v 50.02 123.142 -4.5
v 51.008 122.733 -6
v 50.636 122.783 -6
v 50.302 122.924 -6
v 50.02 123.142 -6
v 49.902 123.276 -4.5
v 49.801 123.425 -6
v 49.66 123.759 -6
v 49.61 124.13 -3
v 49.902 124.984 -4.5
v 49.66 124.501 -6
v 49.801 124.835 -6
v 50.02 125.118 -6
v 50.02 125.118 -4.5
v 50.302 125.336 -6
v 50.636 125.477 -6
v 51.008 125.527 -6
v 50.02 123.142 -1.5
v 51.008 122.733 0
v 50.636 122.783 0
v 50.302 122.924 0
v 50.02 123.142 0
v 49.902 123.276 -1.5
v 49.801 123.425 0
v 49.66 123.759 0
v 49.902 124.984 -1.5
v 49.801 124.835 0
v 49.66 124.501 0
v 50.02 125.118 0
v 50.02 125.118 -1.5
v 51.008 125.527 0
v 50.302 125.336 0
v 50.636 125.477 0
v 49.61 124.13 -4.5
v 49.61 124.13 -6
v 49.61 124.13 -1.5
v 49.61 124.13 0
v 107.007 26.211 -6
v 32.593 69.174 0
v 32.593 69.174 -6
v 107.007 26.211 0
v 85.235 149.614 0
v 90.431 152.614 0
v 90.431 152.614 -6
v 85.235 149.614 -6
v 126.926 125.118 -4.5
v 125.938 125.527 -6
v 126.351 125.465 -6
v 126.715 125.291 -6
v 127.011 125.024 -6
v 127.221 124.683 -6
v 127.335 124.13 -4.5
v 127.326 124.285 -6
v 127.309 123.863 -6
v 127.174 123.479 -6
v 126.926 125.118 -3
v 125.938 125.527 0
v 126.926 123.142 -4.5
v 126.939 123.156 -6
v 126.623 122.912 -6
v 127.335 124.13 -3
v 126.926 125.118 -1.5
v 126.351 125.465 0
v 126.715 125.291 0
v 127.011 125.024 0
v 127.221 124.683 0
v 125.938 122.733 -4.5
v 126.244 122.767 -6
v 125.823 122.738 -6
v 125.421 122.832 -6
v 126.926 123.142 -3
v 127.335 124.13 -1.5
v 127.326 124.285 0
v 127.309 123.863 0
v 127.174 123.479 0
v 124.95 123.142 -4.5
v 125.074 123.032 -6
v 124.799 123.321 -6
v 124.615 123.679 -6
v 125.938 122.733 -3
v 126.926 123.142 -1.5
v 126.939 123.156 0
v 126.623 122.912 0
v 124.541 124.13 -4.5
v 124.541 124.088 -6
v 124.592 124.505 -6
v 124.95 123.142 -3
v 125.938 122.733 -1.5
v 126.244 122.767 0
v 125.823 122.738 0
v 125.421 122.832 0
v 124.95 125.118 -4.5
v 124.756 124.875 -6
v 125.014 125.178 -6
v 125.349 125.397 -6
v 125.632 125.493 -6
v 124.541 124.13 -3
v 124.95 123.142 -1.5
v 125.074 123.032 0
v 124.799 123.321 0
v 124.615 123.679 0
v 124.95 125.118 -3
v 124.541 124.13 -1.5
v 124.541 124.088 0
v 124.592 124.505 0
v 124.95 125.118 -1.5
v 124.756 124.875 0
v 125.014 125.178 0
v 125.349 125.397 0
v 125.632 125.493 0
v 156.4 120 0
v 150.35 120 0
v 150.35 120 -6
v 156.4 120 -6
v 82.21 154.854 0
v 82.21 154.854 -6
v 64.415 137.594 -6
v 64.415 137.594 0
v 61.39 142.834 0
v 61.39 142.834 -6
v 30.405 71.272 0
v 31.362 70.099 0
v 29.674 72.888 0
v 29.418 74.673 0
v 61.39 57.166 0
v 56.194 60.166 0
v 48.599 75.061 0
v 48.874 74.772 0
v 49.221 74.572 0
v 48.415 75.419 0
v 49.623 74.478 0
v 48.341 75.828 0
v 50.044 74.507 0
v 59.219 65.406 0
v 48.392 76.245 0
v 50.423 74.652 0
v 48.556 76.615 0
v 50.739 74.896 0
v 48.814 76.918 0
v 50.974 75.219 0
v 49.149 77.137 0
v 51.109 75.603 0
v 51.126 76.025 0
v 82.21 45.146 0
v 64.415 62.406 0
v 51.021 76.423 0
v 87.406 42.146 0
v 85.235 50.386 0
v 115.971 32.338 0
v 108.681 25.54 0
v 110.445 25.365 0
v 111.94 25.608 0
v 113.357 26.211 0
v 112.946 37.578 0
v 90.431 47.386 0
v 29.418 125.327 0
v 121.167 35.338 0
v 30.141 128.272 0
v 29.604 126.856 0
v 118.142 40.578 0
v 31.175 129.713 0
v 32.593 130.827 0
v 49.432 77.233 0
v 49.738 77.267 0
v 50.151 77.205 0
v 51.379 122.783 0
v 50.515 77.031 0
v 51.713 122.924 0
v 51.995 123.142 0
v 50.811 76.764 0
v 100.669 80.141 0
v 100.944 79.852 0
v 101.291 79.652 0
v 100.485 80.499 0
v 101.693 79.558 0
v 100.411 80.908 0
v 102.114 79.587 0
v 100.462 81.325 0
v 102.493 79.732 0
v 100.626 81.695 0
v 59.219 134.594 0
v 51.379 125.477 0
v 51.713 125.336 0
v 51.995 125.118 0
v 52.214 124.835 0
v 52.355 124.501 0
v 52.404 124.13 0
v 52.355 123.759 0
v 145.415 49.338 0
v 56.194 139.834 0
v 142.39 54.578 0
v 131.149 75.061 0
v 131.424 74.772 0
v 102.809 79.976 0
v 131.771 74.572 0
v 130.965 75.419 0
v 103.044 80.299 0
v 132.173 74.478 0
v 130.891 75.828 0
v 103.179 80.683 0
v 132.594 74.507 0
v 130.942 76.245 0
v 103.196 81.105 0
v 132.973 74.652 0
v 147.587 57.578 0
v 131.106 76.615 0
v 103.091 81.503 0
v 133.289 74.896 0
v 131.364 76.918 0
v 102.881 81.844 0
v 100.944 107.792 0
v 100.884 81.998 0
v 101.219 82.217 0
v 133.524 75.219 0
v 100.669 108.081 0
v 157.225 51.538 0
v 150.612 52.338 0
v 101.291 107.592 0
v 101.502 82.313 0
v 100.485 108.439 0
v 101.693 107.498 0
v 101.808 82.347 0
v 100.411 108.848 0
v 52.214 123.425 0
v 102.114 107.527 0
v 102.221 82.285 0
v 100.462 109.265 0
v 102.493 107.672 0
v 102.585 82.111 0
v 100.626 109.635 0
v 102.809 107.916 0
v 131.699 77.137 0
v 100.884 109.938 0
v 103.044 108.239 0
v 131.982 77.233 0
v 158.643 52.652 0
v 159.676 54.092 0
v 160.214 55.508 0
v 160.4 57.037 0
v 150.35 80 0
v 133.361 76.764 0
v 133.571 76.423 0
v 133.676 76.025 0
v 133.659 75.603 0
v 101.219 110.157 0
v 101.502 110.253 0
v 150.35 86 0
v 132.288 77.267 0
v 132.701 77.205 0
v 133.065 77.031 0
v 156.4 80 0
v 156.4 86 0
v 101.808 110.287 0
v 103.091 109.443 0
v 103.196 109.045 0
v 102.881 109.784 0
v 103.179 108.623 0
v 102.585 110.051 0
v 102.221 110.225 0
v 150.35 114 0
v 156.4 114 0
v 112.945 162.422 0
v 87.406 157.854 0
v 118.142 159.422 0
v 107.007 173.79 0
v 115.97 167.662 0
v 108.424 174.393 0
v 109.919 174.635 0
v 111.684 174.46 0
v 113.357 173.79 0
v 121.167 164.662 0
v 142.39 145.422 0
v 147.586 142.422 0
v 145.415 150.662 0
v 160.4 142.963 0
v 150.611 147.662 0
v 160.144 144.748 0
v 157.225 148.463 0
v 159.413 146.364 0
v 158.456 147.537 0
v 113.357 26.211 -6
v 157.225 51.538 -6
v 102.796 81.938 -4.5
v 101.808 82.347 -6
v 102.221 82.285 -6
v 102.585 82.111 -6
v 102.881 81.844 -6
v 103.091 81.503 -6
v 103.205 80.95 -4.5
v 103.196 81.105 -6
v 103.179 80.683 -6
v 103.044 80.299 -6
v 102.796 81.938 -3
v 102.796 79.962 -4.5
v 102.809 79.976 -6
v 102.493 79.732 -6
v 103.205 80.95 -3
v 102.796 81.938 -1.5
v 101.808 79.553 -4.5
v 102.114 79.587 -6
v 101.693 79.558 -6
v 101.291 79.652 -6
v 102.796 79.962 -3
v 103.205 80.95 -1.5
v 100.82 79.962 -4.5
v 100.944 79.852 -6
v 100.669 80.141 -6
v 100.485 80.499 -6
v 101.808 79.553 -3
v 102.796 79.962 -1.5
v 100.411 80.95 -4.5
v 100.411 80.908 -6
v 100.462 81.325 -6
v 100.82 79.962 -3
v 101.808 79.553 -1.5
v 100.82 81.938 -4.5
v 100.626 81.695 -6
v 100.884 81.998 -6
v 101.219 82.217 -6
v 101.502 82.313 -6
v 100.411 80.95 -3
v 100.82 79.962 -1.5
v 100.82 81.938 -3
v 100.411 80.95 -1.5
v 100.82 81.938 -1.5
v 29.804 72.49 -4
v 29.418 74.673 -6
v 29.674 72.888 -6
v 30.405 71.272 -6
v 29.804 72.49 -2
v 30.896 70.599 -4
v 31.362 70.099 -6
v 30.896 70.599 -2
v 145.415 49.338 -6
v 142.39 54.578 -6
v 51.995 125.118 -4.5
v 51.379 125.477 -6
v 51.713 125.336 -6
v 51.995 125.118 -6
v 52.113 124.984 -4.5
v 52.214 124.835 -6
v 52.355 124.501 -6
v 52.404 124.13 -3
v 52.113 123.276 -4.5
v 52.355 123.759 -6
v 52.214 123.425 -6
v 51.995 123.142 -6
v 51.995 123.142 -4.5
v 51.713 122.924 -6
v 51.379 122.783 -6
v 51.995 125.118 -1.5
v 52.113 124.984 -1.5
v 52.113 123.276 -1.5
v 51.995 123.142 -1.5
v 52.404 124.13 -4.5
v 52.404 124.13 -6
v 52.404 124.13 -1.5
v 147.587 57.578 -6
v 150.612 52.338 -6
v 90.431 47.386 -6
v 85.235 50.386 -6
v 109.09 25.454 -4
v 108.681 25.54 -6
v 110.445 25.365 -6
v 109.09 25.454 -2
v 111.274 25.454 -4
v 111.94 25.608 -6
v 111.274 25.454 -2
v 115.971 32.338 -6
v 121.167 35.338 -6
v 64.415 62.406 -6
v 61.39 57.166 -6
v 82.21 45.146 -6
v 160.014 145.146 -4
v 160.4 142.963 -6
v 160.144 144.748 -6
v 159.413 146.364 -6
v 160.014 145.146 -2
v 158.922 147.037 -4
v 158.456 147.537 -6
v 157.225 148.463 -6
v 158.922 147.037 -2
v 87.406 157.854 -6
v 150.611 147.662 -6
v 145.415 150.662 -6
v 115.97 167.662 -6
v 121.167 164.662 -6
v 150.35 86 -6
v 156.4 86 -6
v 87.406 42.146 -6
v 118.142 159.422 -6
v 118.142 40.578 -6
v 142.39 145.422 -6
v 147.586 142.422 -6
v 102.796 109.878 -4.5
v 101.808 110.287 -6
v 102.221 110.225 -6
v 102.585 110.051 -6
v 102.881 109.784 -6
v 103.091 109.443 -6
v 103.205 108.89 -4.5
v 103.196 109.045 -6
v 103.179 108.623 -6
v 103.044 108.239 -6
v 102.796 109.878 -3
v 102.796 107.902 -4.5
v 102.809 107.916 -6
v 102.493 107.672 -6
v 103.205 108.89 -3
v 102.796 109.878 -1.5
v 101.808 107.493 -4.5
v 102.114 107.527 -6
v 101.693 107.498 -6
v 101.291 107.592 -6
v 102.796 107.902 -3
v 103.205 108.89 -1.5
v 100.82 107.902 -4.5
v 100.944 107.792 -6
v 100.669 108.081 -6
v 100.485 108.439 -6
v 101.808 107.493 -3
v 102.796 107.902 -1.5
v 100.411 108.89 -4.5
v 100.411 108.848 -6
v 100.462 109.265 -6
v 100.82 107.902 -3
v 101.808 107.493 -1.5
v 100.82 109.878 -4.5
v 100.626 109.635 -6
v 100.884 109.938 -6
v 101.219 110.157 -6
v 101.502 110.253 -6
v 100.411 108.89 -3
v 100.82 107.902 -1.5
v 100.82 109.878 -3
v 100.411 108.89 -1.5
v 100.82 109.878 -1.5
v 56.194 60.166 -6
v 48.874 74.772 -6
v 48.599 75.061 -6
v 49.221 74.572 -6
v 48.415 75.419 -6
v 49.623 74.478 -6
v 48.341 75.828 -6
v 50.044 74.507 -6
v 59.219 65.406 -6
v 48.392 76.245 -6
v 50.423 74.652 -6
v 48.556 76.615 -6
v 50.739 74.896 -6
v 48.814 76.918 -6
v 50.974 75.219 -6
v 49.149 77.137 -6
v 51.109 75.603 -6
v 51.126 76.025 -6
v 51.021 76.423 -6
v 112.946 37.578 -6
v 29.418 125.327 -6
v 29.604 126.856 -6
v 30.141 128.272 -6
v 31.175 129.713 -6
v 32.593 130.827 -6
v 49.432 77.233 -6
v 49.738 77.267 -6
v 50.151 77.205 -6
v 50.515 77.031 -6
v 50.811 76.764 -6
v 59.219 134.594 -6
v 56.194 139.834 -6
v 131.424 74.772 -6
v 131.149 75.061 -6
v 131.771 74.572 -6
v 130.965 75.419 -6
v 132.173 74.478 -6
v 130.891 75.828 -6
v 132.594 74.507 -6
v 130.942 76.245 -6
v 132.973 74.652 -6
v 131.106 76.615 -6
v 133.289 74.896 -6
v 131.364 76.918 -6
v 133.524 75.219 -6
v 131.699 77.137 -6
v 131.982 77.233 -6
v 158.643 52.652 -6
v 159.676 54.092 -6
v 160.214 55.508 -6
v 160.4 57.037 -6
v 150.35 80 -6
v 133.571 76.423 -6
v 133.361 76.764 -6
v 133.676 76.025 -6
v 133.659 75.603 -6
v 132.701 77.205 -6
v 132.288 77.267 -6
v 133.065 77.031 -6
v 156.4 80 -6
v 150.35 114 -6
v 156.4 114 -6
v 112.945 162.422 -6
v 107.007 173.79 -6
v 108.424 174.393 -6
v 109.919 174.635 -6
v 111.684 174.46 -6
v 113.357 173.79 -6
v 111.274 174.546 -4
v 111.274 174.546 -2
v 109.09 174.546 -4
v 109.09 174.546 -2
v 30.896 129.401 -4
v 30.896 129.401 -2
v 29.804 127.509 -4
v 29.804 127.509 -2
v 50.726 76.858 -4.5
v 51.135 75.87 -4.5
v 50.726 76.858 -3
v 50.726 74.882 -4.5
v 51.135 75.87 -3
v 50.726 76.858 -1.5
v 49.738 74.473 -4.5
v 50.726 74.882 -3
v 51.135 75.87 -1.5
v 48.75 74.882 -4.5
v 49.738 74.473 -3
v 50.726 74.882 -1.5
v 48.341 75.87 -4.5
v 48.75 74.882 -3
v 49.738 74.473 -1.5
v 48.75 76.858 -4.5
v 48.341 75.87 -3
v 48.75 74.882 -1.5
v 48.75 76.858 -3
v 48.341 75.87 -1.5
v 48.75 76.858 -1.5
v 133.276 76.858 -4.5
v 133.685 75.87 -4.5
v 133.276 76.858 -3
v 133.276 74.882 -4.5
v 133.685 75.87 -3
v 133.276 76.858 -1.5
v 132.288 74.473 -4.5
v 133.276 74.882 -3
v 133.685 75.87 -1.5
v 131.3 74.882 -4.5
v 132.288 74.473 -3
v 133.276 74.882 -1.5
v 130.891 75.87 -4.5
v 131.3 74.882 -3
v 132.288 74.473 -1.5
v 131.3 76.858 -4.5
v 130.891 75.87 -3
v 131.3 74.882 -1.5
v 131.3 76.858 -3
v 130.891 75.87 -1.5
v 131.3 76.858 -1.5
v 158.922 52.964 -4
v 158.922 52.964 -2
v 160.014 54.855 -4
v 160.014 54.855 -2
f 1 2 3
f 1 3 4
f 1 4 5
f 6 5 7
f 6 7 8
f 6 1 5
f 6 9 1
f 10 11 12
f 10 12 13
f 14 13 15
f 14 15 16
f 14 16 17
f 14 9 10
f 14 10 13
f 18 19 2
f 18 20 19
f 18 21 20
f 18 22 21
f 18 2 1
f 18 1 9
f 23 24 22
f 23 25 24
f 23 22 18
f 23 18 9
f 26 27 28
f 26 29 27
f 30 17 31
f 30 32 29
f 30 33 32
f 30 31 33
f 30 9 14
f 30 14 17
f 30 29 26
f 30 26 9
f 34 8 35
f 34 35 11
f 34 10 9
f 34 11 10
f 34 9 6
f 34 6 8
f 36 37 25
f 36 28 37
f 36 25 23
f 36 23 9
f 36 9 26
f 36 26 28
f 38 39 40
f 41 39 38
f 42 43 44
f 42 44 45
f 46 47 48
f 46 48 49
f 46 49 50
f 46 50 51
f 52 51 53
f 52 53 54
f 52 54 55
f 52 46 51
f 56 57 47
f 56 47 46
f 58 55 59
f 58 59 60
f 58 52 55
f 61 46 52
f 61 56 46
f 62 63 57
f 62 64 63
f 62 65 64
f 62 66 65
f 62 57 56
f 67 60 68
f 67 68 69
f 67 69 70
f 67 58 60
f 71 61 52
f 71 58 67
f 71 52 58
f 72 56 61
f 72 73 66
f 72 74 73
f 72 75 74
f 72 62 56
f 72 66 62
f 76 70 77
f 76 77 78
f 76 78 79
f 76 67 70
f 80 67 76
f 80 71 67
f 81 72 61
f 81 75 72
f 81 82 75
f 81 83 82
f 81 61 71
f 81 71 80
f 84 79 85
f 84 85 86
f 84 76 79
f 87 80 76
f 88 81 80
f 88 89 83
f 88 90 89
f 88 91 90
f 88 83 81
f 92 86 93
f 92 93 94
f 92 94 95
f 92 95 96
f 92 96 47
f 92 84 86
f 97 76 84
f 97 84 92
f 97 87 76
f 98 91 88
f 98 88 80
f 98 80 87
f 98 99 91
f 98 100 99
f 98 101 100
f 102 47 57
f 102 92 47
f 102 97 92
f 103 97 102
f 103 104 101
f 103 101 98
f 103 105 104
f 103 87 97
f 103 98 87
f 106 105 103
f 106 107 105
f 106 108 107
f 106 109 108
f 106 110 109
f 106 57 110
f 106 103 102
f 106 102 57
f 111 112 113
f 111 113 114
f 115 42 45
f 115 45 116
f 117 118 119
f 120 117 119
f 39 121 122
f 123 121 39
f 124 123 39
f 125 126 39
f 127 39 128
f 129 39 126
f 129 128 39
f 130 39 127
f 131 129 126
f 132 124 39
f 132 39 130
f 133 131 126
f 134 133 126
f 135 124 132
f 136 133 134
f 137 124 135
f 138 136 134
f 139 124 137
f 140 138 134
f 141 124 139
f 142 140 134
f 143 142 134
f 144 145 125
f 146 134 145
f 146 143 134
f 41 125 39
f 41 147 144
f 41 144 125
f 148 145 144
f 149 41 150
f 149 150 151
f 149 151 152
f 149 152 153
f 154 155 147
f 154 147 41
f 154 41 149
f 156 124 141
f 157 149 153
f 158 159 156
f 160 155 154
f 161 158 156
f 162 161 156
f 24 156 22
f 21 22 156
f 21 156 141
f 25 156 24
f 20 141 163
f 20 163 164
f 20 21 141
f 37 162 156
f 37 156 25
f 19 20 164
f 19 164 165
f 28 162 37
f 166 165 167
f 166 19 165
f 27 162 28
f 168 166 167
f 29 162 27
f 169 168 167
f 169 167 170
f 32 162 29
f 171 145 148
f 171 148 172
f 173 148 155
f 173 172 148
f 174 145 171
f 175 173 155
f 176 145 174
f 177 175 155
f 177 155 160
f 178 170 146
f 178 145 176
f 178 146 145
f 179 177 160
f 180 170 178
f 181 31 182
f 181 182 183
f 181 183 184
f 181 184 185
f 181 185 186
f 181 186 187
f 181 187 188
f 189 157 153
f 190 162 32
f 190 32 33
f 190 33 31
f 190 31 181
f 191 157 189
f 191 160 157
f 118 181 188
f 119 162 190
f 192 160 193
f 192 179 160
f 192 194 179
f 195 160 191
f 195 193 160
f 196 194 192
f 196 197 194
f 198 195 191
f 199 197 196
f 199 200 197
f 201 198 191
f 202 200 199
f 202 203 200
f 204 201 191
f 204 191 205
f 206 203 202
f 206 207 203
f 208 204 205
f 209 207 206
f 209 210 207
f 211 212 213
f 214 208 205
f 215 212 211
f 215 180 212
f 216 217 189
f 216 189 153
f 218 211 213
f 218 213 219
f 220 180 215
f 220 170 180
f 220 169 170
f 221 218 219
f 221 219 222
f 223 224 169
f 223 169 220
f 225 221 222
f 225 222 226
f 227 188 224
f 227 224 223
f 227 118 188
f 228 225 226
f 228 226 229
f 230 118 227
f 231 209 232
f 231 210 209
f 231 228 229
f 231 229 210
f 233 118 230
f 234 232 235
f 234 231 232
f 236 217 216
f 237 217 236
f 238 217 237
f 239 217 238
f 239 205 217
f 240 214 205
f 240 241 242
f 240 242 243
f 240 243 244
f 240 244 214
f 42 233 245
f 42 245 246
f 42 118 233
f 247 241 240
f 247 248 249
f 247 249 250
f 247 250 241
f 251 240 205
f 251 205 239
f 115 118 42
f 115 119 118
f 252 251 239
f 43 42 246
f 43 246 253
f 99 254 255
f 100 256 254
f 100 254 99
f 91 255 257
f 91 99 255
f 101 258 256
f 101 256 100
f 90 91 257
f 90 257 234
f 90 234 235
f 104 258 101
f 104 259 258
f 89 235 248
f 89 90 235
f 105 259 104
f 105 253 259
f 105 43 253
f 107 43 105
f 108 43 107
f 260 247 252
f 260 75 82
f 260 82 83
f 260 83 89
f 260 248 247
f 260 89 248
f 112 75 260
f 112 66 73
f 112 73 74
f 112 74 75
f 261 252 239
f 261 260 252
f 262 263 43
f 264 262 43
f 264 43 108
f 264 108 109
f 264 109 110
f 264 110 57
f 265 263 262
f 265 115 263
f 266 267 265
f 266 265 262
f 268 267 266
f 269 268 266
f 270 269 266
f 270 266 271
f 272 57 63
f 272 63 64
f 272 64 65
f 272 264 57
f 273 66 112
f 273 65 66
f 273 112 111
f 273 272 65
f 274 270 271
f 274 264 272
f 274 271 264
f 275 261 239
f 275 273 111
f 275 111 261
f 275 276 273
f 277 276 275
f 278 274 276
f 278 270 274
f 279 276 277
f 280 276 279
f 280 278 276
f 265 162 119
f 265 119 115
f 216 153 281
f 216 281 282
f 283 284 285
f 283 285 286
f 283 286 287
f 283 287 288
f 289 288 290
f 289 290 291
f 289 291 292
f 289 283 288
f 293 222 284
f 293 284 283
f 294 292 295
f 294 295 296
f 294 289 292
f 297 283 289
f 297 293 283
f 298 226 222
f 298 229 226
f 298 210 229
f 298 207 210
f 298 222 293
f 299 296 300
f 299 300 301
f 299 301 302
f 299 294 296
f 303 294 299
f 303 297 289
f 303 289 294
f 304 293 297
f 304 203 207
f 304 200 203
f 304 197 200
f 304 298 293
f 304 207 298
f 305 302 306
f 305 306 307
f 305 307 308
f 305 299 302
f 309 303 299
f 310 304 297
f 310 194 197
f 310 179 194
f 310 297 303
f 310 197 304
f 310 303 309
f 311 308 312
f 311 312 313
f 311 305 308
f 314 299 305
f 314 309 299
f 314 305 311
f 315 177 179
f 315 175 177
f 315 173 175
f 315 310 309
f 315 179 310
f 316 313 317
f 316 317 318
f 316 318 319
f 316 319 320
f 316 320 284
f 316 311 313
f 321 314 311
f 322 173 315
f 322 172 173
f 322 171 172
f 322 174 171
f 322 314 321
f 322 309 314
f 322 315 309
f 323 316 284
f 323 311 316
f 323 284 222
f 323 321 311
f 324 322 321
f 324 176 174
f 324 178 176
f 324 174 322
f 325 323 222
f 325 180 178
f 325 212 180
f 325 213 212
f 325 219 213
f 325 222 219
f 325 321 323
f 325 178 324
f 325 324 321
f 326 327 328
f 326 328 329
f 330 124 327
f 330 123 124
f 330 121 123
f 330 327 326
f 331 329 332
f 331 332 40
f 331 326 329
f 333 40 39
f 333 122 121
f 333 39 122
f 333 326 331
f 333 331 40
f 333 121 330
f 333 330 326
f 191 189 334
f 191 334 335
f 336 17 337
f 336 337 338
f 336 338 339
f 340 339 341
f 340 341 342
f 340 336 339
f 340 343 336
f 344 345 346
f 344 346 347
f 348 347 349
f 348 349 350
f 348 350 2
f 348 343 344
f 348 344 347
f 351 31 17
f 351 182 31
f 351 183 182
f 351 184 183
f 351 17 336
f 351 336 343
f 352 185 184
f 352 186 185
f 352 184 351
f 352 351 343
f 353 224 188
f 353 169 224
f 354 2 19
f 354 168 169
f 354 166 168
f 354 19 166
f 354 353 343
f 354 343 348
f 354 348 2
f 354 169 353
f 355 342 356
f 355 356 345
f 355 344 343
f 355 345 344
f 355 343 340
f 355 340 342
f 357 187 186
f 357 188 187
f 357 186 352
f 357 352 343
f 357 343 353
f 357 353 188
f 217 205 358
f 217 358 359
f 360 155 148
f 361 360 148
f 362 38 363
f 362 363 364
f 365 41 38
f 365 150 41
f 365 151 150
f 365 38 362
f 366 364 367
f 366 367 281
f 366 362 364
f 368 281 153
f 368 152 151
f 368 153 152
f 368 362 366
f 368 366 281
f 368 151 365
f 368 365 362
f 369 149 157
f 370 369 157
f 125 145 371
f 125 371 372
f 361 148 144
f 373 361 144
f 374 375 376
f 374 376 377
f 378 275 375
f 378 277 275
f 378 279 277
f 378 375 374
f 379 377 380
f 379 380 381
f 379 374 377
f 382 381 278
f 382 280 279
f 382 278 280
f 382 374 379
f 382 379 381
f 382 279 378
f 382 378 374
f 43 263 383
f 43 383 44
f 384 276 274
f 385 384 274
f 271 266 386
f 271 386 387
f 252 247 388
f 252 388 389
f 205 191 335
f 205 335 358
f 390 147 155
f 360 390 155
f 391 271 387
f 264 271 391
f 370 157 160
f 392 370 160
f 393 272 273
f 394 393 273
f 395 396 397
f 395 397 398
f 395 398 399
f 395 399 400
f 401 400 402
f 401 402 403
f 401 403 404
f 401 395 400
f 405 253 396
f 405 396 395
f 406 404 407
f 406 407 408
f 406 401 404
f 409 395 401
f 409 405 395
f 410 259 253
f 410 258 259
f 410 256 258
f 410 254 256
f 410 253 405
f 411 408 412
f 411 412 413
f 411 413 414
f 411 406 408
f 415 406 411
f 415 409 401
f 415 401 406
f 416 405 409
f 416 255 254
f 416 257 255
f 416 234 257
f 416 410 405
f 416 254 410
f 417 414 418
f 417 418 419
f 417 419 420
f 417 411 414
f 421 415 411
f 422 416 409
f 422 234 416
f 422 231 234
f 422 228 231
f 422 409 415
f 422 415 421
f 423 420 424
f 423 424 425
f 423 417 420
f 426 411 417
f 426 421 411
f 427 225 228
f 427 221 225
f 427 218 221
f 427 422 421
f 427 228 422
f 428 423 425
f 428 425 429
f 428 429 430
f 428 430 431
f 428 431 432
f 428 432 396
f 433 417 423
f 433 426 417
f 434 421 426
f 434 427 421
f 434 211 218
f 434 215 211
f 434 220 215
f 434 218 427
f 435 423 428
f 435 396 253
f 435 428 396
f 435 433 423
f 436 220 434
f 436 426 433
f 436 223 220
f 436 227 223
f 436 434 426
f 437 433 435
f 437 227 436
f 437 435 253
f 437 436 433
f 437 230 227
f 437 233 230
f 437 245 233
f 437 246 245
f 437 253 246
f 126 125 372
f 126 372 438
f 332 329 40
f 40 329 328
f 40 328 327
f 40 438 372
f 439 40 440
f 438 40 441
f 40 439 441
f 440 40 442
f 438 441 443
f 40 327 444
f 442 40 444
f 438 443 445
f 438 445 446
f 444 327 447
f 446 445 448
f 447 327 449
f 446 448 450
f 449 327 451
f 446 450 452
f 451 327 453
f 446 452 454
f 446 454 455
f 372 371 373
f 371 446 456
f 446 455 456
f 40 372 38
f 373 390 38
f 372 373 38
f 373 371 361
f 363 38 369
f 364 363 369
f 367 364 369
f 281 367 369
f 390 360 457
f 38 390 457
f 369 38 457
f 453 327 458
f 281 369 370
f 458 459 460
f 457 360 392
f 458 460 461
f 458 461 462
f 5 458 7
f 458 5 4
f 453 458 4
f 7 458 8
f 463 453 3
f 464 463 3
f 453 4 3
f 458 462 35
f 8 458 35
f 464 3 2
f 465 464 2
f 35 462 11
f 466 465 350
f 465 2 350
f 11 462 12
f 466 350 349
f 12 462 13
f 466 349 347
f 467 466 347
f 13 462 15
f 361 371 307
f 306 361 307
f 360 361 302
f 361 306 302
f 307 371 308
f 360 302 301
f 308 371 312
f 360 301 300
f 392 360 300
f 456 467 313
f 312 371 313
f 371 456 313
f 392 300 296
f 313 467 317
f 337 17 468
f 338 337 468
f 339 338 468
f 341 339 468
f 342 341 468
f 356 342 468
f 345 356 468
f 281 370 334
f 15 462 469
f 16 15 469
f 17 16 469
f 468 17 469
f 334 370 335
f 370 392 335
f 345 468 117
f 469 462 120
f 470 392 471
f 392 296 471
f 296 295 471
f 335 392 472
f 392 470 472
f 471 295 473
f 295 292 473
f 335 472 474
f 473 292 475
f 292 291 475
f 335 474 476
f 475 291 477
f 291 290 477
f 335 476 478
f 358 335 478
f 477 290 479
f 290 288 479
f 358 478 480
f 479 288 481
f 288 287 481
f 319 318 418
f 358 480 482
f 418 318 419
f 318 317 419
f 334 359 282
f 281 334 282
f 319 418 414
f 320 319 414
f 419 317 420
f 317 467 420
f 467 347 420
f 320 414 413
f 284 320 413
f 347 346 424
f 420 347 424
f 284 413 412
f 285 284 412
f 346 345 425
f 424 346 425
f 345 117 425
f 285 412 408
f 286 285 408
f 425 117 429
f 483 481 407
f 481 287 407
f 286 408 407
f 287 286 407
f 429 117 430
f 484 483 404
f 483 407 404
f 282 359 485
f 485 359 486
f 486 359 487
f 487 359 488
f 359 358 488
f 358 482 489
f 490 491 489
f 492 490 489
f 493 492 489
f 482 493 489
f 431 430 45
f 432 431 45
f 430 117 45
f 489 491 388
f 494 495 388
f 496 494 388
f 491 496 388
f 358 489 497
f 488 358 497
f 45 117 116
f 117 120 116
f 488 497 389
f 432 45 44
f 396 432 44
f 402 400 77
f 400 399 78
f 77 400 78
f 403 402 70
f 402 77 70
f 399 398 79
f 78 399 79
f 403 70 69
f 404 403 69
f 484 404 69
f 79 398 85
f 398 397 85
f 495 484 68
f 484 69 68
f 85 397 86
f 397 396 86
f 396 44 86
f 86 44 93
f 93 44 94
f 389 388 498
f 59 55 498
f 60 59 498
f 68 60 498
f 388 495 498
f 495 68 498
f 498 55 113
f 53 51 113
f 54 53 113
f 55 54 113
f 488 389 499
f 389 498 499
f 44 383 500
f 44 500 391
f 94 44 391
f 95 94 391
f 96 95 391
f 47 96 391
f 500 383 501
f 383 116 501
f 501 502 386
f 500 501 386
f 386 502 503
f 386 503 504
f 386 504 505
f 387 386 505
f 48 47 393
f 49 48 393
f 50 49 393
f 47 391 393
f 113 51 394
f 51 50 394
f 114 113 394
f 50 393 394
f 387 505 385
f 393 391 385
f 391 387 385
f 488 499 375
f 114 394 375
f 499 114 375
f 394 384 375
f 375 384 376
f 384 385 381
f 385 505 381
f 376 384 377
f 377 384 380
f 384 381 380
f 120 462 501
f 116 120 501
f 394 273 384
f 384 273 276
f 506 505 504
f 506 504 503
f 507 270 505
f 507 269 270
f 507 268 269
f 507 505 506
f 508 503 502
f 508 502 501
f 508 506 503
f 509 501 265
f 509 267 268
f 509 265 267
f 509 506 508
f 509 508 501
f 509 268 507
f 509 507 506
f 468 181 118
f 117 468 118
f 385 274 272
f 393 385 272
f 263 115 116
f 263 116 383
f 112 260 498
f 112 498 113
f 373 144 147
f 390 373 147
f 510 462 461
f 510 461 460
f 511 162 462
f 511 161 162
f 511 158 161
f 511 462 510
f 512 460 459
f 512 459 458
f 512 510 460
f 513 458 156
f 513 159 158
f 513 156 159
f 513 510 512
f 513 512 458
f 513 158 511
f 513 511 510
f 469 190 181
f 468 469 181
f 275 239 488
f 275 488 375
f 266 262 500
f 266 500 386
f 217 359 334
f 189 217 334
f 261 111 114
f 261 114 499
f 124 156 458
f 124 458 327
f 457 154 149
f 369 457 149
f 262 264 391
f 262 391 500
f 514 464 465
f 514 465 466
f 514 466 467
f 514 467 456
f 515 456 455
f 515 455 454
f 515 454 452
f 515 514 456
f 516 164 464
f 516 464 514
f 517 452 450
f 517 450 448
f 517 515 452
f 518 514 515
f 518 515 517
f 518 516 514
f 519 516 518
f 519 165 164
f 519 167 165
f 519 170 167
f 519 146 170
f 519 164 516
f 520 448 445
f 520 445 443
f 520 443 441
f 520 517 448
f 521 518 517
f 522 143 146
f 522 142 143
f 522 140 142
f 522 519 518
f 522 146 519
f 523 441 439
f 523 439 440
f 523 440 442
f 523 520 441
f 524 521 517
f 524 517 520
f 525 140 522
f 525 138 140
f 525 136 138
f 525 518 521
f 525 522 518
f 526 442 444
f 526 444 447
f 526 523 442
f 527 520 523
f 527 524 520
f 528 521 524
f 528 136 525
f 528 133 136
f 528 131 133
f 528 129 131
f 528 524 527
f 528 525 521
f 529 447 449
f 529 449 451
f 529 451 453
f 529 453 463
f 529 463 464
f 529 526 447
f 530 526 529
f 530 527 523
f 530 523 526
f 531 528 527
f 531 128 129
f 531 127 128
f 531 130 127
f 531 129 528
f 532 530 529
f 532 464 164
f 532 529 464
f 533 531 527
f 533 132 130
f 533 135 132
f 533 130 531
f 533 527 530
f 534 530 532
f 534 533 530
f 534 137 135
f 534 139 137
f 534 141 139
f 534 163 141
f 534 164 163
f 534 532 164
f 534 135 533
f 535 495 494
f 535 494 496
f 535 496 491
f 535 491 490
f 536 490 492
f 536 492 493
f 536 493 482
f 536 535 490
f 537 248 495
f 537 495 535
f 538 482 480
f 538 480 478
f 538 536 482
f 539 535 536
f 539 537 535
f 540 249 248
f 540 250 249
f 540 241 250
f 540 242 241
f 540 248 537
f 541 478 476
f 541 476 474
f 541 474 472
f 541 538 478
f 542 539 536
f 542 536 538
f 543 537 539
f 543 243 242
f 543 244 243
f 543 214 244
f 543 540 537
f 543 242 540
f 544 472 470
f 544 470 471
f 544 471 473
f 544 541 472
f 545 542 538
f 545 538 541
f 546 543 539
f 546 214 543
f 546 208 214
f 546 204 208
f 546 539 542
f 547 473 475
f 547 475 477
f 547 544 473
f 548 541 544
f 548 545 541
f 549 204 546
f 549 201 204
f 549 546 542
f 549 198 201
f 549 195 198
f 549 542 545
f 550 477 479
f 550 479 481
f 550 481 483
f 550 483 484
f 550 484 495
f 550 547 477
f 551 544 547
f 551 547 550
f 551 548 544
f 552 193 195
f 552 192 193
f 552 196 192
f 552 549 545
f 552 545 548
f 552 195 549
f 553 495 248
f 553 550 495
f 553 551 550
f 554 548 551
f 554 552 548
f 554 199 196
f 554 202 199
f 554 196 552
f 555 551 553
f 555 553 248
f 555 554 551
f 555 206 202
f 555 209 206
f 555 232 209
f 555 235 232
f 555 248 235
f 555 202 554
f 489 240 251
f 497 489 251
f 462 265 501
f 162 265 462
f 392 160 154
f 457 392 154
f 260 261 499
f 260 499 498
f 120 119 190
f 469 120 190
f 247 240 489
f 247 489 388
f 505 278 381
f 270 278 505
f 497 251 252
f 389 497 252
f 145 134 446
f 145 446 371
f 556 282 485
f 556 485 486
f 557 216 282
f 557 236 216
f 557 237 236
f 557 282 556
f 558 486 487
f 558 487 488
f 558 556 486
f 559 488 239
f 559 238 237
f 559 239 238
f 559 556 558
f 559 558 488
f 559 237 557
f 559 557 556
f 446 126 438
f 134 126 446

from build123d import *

# Parameters (mm, degrees)
CORTE_W                 = 6.05
CORTE_H                 = 6
SALIENTE_EXTRUIR1_DEPTH = 6


with BuildPart() as part:
    # Corte → Saliente-Extruir1 (new body)
    with BuildSketch(Plane.XY):
        with BuildLine():
            Line((113.357081542, 26.21056425), (157.224997542, 51.53767625))
            add(Edge.make_bspline(
                [(157.224997542, 51.53767625), (159.190322542, 52.67288025), (160.400350542, 54.76749825), (160.399997542, 57.03698825)],
                knots=[0, 0, 0, 0, 1, 1, 1, 1], degree=3))
            Line((160.399997542, 57.03698825), (160.399997542, 142.96314225))
            add(Edge.make_bspline(
                [(160.399997542, 142.96314225), (160.399645542, 145.23256125), (159.190675542, 147.32841425), (157.224997542, 148.46259425)],
                knots=[0, 0, 0, 0, 1, 1, 1, 1], degree=3))
            Line((157.224997542, 148.46259425), (113.357081542, 173.78956925))
            add(Edge.make_bspline(
                [(113.357081542, 173.78956925), (111.391403542, 174.92375025), (108.972053542, 174.92480825), (107.007081542, 173.78956925)],
                knots=[0, 0, 0, 0, 1, 1, 1, 1], degree=3))
            Line((107.007081542, 173.78956925), (32.592792542, 130.82652825))
            add(Edge.make_bspline(
                [(32.592792542, 130.82652825), (30.627711542, 129.69128925), (29.417379542, 127.59649425), (29.417792542, 125.32707525)],
                knots=[0, 0, 0, 0, 1, 1, 1, 1], degree=3))
            Line((29.417792542, 125.32707525), (29.417792542, 74.67277225))
            add(Edge.make_bspline(
                [(29.417792542, 74.67277225), (29.418206542, 72.40335325), (30.627157542, 70.30785325), (32.592792542, 69.17367225)],
                knots=[0, 0, 0, 0, 1, 1, 1, 1], degree=3))
            Line((32.592792542, 69.17367225), (107.007081542, 26.21056425))
            add(Edge.make_bspline(
                [(107.007081542, 26.21056425), (108.972758542, 25.07630125), (111.391756542, 25.07533725), (113.357081542, 26.21056425)],
                knots=[0, 0, 0, 0, 1, 1, 1, 1], degree=3))
        make_face()
        Polygon((82.209667177, 45.146306921), (87.405777131, 42.146233364), (90.430851301, 47.385644235), (85.234741347, 50.385717791), align=None, mode=Mode.SUBTRACT)
        Polygon((59.219111627, 65.405686508), (64.415251823, 62.405665331), (61.39023047, 57.166223967), (56.194090274, 60.166245143), align=None, mode=Mode.SUBTRACT)
        Polygon((115.970526872, 32.338235445), (121.166681404, 35.338231793), (118.141685086, 40.577687612), (112.945530555, 37.577691264), align=None, mode=Mode.SUBTRACT)
        Polygon((147.586560764, 57.577666916), (150.611557081, 52.338211097), (145.41540255, 49.338214749), (142.390406233, 54.577670568), align=None, mode=Mode.SUBTRACT)
        Polygon((59.219036883, 134.594225381), (64.415170597, 137.594257784), (61.390137924, 142.833692613), (56.194004209, 139.83366021), align=None, mode=Mode.SUBTRACT)
        Polygon((82.20954866, 154.853654641), (87.405652132, 157.853739425), (90.430737623, 152.61433509), (85.234634151, 149.614250307), align=None, mode=Mode.SUBTRACT)
        Polygon((112.945395686, 162.422336706), (115.970380683, 167.661799061), (121.166541696, 164.66181394), (118.141556699, 159.422351585), align=None, mode=Mode.SUBTRACT)
        Polygon((147.586469106, 142.422435899), (150.611454103, 147.661898254), (145.41529309, 150.661883375), (142.390308093, 145.42242102), align=None, mode=Mode.SUBTRACT)
        with Locations((153.374997542, 83.000060929)):
            Rectangle(CORTE_W, CORTE_H, mode=Mode.SUBTRACT)
        Polygon((150.349997542, 120.000060929), (156.399997542, 120.000060929), (156.399997542, 114.000060929), (150.349997542, 114.000054393), align=None, mode=Mode.SUBTRACT)
        with BuildLine():
            add(Edge.make_bspline(
                [(51.13479556, 75.869945702), (51.134797227, 75.098420702), (50.509323579, 74.47294435), (49.737798579, 74.472942683)],
                knots=[0, 0, 0, 0, 1, 1, 1, 1], degree=3))
            add(Edge.make_bspline(
                [(49.737798579, 74.472942683), (48.966273579, 74.472941016), (48.340797227, 75.098414665), (48.34079556, 75.869939665)],
                knots=[0, 0, 0, 0, 1, 1, 1, 1], degree=3))
            add(Edge.make_bspline(
                [(48.34079556, 75.869939665), (48.340793893, 76.641464665), (48.966267542, 77.266941016), (49.737792542, 77.266942683)],
                knots=[0, 0, 0, 0, 1, 1, 1, 1], degree=3))
            add(Edge.make_bspline(
                [(49.737792542, 77.266942683), (50.509317542, 77.26694435), (51.134793893, 76.641470702), (51.13479556, 75.869945702)],
                knots=[0, 0, 0, 0, 1, 1, 1, 1], degree=3))
        make_face(mode=Mode.SUBTRACT)
        with BuildLine():
            add(Edge.make_bspline(
                [(52.40444356, 124.12993061), (52.404445227, 123.35840561), (51.778971579, 122.732929259), (51.007798579, 122.732927592)],
                knots=[0, 0, 0, 0, 1, 1, 1, 1], degree=3))
            add(Edge.make_bspline(
                [(51.007798579, 122.732927592), (50.235921579, 122.732925925), (49.610445227, 123.358399573), (49.61044356, 124.129924573)],
                knots=[0, 0, 0, 0, 1, 1, 1, 1], degree=3))
            add(Edge.make_bspline(
                [(49.61044356, 124.129924573), (49.610441893, 124.901449573), (50.235915542, 125.526925925), (51.007792542, 125.526927592)],
                knots=[0, 0, 0, 0, 1, 1, 1, 1], degree=3))
            add(Edge.make_bspline(
                [(51.007792542, 125.526927592), (51.778965542, 125.526929259), (52.404441893, 124.90145561), (52.40444356, 124.12993061)],
                knots=[0, 0, 0, 0, 1, 1, 1, 1], degree=3))
        make_face(mode=Mode.SUBTRACT)
        with BuildLine():
            add(Edge.make_bspline(
                [(103.20479556, 108.88993061), (103.204797227, 108.11840561), (102.579323579, 107.492929259), (101.807798579, 107.492927592)],
                knots=[0, 0, 0, 0, 1, 1, 1, 1], degree=3))
            add(Edge.make_bspline(
                [(101.807798579, 107.492927592), (101.036273579, 107.492925925), (100.410797227, 108.118399573), (100.41079556, 108.889924573)],
                knots=[0, 0, 0, 0, 1, 1, 1, 1], degree=3))
            add(Edge.make_bspline(
                [(100.41079556, 108.889924573), (100.410793893, 109.661449573), (101.036267542, 110.286925925), (101.807792542, 110.286927592)],
                knots=[0, 0, 0, 0, 1, 1, 1, 1], degree=3))
            add(Edge.make_bspline(
                [(101.807792542, 110.286927592), (102.579317542, 110.286929259), (103.204793893, 109.66145561), (103.20479556, 108.88993061)],
                knots=[0, 0, 0, 0, 1, 1, 1, 1], degree=3))
        make_face(mode=Mode.SUBTRACT)
        with BuildLine():
            add(Edge.make_bspline(
                [(103.20479556, 80.94993061), (103.204797227, 80.17840561), (102.579323579, 79.552929259), (101.807798579, 79.552927592)],
                knots=[0, 0, 0, 0, 1, 1, 1, 1], degree=3))
            add(Edge.make_bspline(
                [(101.807798579, 79.552927592), (101.036273579, 79.552925925), (100.410797227, 80.178399573), (100.41079556, 80.949924573)],
                knots=[0, 0, 0, 0, 1, 1, 1, 1], degree=3))
            add(Edge.make_bspline(
                [(100.41079556, 80.949924573), (100.410793893, 81.721449573), (101.036267542, 82.346925925), (101.807792542, 82.346927592)],
                knots=[0, 0, 0, 0, 1, 1, 1, 1], degree=3))
            add(Edge.make_bspline(
                [(101.807792542, 82.346927592), (102.579317542, 82.346929259), (103.204793893, 81.72145561), (103.20479556, 80.94993061)],
                knots=[0, 0, 0, 0, 1, 1, 1, 1], degree=3))
        make_face(mode=Mode.SUBTRACT)
        with BuildLine():
            add(Edge.make_bspline(
                [(133.68479556, 75.86993061), (133.684797227, 75.09840561), (133.059323579, 74.472929259), (132.287798579, 74.472927592)],
                knots=[0, 0, 0, 0, 1, 1, 1, 1], degree=3))
            add(Edge.make_bspline(
                [(132.287798579, 74.472927592), (131.516273579, 74.472925925), (130.890797227, 75.098399573), (130.89079556, 75.869924573)],
                knots=[0, 0, 0, 0, 1, 1, 1, 1], degree=3))
            add(Edge.make_bspline(
                [(130.89079556, 75.869924573), (130.890793893, 76.641449573), (131.516267542, 77.266925925), (132.287792542, 77.266927592)],
                knots=[0, 0, 0, 0, 1, 1, 1, 1], degree=3))
            add(Edge.make_bspline(
                [(132.287792542, 77.266927592), (133.059317542, 77.266929259), (133.684793893, 76.64145561), (133.68479556, 75.86993061)],
                knots=[0, 0, 0, 0, 1, 1, 1, 1], degree=3))
        make_face(mode=Mode.SUBTRACT)
        with BuildLine():
            add(Edge.make_bspline(
                [(127.33479556, 124.12993061), (127.334797227, 123.35840561), (126.709323579, 122.732929259), (125.937798579, 122.732927592)],
                knots=[0, 0, 0, 0, 1, 1, 1, 1], degree=3))
            add(Edge.make_bspline(
                [(125.937798579, 122.732927592), (125.166273579, 122.732925925), (124.540797227, 123.358399573), (124.54079556, 124.129924573)],
                knots=[0, 0, 0, 0, 1, 1, 1, 1], degree=3))
            add(Edge.make_bspline(
                [(124.54079556, 124.129924573), (124.540793893, 124.901449573), (125.166267542, 125.526925925), (125.937792542, 125.526927592)],
                knots=[0, 0, 0, 0, 1, 1, 1, 1], degree=3))
            add(Edge.make_bspline(
                [(125.937792542, 125.526927592), (126.709317542, 125.526929259), (127.334793893, 124.90145561), (127.33479556, 124.12993061)],
                knots=[0, 0, 0, 0, 1, 1, 1, 1], degree=3))
        make_face(mode=Mode.SUBTRACT)
    extrude(amount=-SALIENTE_EXTRUIR1_DEPTH)


solid = part.part
